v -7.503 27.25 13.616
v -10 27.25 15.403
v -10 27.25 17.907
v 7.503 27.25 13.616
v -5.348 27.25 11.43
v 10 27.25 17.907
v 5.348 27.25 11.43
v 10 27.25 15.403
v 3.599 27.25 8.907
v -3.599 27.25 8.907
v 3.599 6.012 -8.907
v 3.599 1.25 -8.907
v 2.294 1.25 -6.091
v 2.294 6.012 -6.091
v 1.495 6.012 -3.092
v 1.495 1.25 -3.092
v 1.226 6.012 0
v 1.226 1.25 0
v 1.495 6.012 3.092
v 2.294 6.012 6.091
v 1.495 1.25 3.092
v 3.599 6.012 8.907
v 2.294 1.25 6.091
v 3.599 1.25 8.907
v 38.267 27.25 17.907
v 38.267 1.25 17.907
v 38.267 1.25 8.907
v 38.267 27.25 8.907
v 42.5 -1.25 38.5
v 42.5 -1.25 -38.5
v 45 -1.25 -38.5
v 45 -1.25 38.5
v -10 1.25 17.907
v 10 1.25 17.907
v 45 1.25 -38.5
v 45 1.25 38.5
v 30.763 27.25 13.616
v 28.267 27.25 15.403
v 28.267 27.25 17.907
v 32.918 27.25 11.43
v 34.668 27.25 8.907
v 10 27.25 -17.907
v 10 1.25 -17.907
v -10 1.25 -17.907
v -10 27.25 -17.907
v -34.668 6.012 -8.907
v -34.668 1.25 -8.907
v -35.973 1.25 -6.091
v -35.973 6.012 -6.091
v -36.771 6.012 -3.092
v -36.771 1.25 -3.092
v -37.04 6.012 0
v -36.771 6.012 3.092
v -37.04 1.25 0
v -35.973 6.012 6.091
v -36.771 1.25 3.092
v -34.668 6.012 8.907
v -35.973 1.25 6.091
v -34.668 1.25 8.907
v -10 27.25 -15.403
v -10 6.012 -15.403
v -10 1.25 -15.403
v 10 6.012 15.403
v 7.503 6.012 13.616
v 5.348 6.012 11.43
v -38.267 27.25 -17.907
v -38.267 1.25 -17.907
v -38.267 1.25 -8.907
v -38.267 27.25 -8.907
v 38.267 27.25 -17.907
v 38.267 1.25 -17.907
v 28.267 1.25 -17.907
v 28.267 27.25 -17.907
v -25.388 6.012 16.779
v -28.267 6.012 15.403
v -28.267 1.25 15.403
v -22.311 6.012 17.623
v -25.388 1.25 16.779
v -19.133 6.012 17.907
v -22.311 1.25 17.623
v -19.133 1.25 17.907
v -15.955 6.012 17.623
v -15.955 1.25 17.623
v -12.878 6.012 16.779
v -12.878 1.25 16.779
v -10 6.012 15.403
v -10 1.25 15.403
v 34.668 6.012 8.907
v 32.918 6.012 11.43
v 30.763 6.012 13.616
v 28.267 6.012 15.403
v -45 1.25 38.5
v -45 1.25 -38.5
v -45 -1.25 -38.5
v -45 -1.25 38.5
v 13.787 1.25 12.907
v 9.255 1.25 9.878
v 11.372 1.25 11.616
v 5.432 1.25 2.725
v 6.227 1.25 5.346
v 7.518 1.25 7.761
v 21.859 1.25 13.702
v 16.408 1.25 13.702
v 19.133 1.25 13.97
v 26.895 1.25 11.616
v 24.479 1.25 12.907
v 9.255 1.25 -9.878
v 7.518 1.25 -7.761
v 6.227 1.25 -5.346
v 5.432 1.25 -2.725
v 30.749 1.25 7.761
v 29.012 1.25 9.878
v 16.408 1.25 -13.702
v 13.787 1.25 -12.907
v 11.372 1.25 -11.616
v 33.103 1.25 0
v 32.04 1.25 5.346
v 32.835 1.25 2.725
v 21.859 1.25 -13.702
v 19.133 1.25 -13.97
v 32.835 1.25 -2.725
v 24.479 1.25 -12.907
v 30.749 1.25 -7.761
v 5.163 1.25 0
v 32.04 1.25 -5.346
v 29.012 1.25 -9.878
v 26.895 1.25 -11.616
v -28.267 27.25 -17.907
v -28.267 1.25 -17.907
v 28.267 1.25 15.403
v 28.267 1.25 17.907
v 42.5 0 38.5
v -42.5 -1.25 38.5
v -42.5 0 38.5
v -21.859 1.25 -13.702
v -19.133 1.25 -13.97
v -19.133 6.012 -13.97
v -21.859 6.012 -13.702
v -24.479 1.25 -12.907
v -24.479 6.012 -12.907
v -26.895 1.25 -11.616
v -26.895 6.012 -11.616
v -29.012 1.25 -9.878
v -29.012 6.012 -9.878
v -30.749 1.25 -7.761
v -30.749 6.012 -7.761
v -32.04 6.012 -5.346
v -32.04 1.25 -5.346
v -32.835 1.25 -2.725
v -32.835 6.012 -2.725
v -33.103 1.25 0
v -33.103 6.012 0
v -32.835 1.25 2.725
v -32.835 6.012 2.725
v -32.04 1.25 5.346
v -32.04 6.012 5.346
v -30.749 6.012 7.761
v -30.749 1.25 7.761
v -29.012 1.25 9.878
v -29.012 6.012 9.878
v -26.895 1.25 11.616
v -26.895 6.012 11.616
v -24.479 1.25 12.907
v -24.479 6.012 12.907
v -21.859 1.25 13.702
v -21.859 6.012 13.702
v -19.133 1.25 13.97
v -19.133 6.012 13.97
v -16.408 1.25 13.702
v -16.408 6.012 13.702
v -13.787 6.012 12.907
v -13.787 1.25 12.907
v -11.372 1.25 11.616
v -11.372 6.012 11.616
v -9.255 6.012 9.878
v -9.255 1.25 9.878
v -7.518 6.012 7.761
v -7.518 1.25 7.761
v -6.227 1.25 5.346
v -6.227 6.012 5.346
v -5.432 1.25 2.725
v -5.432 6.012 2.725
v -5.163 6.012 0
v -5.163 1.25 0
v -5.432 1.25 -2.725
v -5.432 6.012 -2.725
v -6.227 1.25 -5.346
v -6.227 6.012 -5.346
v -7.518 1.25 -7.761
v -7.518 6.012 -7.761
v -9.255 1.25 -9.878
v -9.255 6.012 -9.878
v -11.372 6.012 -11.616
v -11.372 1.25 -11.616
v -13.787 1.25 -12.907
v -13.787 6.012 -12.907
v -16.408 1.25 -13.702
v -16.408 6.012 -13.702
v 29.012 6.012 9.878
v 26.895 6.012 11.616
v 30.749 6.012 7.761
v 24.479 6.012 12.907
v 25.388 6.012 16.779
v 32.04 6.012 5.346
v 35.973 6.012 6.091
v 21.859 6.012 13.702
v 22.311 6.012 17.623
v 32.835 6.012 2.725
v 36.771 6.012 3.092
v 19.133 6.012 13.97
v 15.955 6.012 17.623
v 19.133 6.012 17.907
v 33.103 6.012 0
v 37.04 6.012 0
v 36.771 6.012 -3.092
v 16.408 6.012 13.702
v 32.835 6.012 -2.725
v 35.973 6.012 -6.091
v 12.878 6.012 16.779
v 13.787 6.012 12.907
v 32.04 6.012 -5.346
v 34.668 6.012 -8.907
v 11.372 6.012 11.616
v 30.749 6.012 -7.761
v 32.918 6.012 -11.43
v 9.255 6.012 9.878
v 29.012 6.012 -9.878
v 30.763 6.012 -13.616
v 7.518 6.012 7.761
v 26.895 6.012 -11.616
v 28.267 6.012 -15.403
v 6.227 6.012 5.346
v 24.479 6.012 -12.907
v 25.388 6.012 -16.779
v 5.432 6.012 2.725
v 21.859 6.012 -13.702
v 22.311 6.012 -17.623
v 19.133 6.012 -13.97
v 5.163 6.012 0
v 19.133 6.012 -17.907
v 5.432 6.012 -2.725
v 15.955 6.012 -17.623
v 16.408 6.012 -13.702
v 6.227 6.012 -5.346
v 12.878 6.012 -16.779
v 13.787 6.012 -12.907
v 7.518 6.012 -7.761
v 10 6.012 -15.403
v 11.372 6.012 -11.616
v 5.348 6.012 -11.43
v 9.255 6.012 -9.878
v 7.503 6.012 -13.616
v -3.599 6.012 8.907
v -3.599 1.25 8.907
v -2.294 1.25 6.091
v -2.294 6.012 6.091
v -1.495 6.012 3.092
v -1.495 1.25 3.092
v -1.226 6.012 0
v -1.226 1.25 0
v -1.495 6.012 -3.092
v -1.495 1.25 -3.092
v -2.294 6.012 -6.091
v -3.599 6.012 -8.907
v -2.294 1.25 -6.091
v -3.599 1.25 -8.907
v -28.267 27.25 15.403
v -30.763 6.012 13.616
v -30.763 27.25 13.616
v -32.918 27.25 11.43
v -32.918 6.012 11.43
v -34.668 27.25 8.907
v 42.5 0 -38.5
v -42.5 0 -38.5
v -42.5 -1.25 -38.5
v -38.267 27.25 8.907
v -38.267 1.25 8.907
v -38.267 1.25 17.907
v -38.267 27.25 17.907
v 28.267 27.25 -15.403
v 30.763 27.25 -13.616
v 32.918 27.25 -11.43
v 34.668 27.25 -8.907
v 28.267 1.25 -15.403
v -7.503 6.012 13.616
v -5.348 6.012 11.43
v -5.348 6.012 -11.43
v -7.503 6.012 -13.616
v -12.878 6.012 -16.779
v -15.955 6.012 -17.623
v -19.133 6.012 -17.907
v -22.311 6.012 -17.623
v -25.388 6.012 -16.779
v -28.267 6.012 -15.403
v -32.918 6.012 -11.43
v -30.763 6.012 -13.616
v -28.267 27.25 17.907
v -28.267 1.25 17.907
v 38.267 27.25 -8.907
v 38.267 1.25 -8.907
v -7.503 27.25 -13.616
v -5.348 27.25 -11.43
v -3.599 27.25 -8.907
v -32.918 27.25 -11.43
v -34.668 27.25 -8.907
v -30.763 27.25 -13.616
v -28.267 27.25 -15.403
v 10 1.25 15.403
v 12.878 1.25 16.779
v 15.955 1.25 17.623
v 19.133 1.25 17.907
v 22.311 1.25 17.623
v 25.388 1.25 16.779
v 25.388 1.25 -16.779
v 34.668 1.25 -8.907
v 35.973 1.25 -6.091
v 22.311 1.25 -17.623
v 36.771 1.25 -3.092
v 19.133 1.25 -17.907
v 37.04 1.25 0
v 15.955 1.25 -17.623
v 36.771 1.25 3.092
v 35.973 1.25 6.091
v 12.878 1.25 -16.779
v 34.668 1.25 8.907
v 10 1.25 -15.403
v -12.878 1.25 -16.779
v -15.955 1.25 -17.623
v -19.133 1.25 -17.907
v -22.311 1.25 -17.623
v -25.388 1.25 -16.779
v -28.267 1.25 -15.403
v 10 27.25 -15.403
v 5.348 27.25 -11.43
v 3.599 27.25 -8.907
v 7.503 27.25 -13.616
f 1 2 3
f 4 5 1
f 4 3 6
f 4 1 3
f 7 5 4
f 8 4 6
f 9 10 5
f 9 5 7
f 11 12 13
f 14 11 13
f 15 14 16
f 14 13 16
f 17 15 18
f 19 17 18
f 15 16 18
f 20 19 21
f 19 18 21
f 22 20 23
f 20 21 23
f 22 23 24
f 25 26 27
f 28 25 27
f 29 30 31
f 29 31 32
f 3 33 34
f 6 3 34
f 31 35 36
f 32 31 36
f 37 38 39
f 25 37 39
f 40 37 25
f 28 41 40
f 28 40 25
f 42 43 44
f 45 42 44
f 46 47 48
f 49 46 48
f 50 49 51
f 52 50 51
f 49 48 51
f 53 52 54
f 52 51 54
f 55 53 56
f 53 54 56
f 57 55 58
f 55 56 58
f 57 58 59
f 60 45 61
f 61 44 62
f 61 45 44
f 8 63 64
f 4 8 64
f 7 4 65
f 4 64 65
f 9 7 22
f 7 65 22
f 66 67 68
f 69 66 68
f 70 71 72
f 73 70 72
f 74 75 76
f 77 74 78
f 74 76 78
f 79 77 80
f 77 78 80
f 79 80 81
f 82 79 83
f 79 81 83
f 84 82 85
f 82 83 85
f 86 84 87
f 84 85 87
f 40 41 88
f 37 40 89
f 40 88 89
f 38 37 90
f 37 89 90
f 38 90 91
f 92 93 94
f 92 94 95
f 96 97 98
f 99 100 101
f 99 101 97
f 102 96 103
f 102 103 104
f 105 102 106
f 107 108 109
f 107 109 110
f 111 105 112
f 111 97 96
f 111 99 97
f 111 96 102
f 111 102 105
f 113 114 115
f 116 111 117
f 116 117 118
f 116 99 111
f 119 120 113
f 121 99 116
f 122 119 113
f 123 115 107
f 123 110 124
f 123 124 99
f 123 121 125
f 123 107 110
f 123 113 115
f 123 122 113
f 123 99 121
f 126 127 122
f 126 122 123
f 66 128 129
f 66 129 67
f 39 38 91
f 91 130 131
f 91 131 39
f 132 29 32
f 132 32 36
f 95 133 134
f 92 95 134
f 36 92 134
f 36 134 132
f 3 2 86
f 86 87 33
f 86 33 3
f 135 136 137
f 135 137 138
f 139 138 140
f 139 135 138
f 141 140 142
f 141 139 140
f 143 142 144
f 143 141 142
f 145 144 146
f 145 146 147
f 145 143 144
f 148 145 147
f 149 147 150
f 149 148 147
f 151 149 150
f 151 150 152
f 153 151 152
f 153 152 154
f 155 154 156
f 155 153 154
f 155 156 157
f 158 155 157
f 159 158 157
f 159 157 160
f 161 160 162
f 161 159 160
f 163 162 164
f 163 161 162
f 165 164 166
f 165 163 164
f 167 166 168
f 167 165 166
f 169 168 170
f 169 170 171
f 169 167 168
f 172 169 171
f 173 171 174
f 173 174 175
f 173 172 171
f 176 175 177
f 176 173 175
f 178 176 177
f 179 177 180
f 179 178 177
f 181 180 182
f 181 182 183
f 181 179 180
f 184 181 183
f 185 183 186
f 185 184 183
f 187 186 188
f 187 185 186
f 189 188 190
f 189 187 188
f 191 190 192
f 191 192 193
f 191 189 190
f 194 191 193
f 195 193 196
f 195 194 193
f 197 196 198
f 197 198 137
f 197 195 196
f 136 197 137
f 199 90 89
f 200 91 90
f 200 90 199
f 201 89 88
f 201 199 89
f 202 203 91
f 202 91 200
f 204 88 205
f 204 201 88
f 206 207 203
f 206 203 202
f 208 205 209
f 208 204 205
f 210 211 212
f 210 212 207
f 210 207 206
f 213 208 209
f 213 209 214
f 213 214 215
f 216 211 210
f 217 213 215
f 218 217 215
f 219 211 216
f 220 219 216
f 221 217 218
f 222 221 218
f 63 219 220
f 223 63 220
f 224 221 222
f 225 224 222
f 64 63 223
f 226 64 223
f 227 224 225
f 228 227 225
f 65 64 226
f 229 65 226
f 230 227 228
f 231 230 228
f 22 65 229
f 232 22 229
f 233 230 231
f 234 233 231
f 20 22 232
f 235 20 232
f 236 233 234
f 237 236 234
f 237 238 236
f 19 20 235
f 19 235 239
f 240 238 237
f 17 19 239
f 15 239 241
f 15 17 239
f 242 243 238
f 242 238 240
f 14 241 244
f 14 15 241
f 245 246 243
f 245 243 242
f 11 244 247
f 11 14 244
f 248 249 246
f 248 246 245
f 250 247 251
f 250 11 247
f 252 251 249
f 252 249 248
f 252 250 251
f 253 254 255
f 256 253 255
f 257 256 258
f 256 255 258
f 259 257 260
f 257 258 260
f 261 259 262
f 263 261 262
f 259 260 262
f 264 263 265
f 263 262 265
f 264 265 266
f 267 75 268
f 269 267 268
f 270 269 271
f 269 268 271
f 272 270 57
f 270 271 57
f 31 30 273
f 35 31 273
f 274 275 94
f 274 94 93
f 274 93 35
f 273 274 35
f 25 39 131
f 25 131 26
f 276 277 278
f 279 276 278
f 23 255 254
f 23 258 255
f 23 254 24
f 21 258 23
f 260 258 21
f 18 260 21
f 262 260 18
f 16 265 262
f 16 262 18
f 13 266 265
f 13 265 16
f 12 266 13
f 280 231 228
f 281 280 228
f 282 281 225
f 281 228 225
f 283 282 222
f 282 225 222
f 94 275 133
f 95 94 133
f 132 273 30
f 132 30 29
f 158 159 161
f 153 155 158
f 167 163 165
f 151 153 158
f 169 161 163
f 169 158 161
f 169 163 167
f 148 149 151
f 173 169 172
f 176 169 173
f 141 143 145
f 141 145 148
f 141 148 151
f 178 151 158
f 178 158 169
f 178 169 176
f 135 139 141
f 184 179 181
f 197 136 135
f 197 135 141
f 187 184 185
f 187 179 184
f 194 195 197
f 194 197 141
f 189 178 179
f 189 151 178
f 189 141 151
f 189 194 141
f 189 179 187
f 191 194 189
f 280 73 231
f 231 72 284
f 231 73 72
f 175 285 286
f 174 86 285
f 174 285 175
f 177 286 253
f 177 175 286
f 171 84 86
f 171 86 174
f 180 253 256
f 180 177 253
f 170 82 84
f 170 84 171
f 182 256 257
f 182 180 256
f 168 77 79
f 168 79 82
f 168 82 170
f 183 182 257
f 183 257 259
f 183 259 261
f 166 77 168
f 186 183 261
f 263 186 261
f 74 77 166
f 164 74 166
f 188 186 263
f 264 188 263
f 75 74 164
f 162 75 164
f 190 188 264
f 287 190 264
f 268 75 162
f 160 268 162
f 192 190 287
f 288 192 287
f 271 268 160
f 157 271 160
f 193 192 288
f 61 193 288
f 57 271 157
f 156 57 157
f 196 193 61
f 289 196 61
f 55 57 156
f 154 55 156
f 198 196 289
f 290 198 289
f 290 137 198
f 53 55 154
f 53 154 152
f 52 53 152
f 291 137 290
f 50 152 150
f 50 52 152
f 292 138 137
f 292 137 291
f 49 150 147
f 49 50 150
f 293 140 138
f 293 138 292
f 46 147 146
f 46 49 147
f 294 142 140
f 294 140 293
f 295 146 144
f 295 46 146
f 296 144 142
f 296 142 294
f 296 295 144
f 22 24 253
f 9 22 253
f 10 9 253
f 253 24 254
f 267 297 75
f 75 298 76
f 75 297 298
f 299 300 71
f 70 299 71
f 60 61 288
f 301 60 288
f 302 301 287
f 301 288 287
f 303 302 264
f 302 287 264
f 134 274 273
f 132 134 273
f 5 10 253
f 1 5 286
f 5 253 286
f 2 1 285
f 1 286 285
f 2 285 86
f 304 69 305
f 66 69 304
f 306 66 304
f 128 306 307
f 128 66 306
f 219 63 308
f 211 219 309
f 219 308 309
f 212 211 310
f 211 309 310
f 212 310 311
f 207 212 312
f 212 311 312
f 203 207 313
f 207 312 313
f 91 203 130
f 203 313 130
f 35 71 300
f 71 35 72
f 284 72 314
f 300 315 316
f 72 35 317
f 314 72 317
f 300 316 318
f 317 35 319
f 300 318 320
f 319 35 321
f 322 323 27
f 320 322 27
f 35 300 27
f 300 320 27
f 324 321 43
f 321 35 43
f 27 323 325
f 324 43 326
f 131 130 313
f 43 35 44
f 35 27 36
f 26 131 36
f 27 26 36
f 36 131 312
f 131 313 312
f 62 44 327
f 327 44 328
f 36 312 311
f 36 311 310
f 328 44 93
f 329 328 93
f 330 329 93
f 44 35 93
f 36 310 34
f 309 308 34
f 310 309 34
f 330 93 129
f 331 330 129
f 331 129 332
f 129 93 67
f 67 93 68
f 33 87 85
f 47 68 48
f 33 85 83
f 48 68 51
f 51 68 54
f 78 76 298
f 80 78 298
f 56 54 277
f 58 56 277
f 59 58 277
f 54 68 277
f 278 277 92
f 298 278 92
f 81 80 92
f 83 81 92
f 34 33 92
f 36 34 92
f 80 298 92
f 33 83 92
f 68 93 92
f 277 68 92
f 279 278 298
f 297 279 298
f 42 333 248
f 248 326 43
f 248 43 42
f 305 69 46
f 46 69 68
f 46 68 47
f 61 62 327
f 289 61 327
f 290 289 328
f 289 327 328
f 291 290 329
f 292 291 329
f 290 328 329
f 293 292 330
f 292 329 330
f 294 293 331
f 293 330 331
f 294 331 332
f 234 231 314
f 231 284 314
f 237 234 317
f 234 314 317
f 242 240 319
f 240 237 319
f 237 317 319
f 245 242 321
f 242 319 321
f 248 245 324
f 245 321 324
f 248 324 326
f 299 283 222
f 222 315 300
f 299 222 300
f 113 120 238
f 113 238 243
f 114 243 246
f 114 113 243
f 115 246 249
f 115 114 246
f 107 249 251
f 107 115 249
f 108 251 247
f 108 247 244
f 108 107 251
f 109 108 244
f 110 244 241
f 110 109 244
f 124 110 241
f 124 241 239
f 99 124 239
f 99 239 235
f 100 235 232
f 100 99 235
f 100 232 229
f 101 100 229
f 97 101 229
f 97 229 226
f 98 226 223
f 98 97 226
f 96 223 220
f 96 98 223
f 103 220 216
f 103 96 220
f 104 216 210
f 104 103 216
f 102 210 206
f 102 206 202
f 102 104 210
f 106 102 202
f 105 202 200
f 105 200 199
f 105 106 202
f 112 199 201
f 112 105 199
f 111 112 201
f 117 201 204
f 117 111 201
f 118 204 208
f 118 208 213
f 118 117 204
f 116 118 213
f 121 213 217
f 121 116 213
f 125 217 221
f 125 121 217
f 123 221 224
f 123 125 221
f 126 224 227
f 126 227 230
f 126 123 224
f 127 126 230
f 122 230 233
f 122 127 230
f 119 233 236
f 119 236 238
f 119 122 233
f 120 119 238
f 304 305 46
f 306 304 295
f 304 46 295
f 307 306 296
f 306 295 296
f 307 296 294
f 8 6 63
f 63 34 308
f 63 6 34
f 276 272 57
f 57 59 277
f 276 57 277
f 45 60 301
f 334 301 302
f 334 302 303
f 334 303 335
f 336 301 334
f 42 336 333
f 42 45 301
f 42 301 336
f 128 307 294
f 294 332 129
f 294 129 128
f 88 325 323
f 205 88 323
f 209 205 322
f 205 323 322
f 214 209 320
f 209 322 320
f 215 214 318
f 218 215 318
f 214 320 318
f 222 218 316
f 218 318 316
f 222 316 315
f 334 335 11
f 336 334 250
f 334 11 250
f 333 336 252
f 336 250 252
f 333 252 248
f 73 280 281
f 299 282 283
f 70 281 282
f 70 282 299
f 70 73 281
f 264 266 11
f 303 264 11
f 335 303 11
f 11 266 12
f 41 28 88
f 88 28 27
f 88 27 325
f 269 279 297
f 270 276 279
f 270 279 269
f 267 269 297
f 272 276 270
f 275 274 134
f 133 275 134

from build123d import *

# Parameters (mm, degrees)
SKETCH1_W           = 85
SKETCH1_H           = 77
BOSS_EXTRUDE1_DEPTH = 1.25
SKETCH3_R           = 17.907
SKETCH3_R_2         = 13.97
BOSS_EXTRUDE3_DEPTH = 4.7625
BOSS_EXTRUDE7_DEPTH = 26
SKETCH6_W           = 77
SKETCH6_H           = 2.5
BOSS_EXTRUDE8_DEPTH = 2.5


with BuildPart() as part:
    # Sketch1 → Boss-Extrude1 (new body)
    with BuildSketch(Plane(origin=(0, 0, 0), x_dir=(1, 0, 0), z_dir=(0, 1, 0))):
        Rectangle(SKETCH1_W, SKETCH1_H)
    extrude(amount=BOSS_EXTRUDE1_DEPTH)

    # Sketch3 → Boss-Extrude3 (add)
    # profile 1 of 2: a face of its own
    with BuildSketch(Plane(origin=(0, 1.25, 0), x_dir=(1, 0, 0), z_dir=(0, 1, 0))):
        with Locations(Location((19.133331774, 0, 0), (0, 0, 90))):
            Circle(SKETCH3_R)
        with Locations(Location((19.133331774, 0, 0), (0, 0, 90))):
            Circle(SKETCH3_R_2, mode=Mode.SUBTRACT)
    # profile 2 of 2: a face of its own
    with BuildSketch(Plane(origin=(0, 1.25, 0), x_dir=(1, 0, 0), z_dir=(0, 1, 0))):
        with Locations(Location((-19.133331774, 0, 0), (0, 0, 90))):
            Circle(SKETCH3_R)
        with Locations(Location((-19.133331774, 0, 0), (0, 0, 90))):
            Circle(SKETCH3_R_2, mode=Mode.SUBTRACT)
    extrude(amount=BOSS_EXTRUDE3_DEPTH)

    # Sketch4 → Boss-Extrude7 (add)
    with BuildSketch(Plane(origin=(0, 1.25, 0), x_dir=(1, 0, 0), z_dir=(0, 1, 0))):
        with BuildLine():
            ThreePointArc((-34.668002675, 8.907), (-31.887785522, 12.569190849), (-28.266663548, 15.402691314))
            Line((-28.266663548, 15.402691314), (-28.266663548, 17.907))
            Line((-28.266663548, 17.907), (-38.266663548, 17.907))
            Line((-38.266663548, 17.907), (-38.266663548, 8.907))
            Line((-38.266663548, 8.907), (-34.668002675, 8.907))
        make_face()
        with BuildLine():
            ThreePointArc((-28.266663548, -15.402691314), (-31.887785522, -12.569190849), (-34.668002675, -8.907))
            Line((-34.668002675, -8.907), (-38.266663548, -8.907))
            Line((-38.266663548, -8.907), (-38.266663548, -17.907))
            Line((-38.266663548, -17.907), (-28.266663548, -17.907))
            Line((-28.266663548, -17.907), (-28.266663548, -15.402691314))
        make_face()
        with BuildLine():
            Line((0, -8.907), (-3.598660873, -8.907))
            ThreePointArc((-3.598660873, -8.907), (-6.378878026, -12.569190849), (-10, -15.402691314))
            Line((-10, -15.402691314), (-10, -17.907))
            Line((-10, -17.907), (0, -17.907))
            Line((0, -17.907), (0, -8.907))
        make_face()
        with BuildLine():
            ThreePointArc((10, -15.402691314), (6.378878026, -12.569190849), (3.598660873, -8.907))
            Line((3.598660873, -8.907), (0, -8.907))
            Line((0, -8.907), (0, -17.907))
            Line((0, -17.907), (10, -17.907))
            Line((10, -17.907), (10, -15.402691314))
        make_face()
        with BuildLine():
            Line((0, 8.907), (0, 17.907))
            Line((0, 17.907), (-10, 17.907))
            Line((-10, 17.907), (-10, 15.402691314))
            ThreePointArc((-10, 15.402691314), (-6.378878026, 12.569190849), (-3.598660873, 8.907))
            Line((-3.598660873, 8.907), (0, 8.907))
        make_face()
        with BuildLine():
            Line((10, 17.907), (0, 17.907))
            Line((0, 17.907), (0, 8.907))
            Line((0, 8.907), (3.598660873, 8.907))
            ThreePointArc((3.598660873, 8.907), (6.378878026, 12.569190849), (10, 15.402691314))
            Line((10, 15.402691314), (10, 17.907))
        make_face()
        with BuildLine():
            Line((28.266663548, 17.907), (28.266663548, 15.402691314))
            ThreePointArc((28.266663548, 15.402691314), (31.887785522, 12.569190849), (34.668002675, 8.907))
            Line((34.668002675, 8.907), (38.266663548, 8.907))
            Line((38.266663548, 8.907), (38.266663548, 17.907))
            Line((38.266663548, 17.907), (28.266663548, 17.907))
        make_face()
        with BuildLine():
            ThreePointArc((34.668002675, -8.907), (31.887785522, -12.569190849), (28.266663548, -15.402691314))
            Line((28.266663548, -15.402691314), (28.266663548, -17.907))
            Line((28.266663548, -17.907), (38.266663548, -17.907))
            Line((38.266663548, -17.907), (38.266663548, -8.907))
            Line((38.266663548, -8.907), (34.668002675, -8.907))
        make_face()
    extrude(amount=BOSS_EXTRUDE7_DEPTH)

    # Sketch6 → Boss-Extrude8 (add)
    with BuildSketch(Plane.ZY.offset(42.5)):
        Rectangle(SKETCH6_W, SKETCH6_H)
    boss_extrude8 = extrude(amount=BOSS_EXTRUDE8_DEPTH)

    # Mirror1: Boss-Extrude8 across plane
    add(boss_extrude8.mirror(Plane(origin=(0, 0, 0), x_dir=(0, 0, 1), z_dir=(1, 0, 0))))


solid = part.part
